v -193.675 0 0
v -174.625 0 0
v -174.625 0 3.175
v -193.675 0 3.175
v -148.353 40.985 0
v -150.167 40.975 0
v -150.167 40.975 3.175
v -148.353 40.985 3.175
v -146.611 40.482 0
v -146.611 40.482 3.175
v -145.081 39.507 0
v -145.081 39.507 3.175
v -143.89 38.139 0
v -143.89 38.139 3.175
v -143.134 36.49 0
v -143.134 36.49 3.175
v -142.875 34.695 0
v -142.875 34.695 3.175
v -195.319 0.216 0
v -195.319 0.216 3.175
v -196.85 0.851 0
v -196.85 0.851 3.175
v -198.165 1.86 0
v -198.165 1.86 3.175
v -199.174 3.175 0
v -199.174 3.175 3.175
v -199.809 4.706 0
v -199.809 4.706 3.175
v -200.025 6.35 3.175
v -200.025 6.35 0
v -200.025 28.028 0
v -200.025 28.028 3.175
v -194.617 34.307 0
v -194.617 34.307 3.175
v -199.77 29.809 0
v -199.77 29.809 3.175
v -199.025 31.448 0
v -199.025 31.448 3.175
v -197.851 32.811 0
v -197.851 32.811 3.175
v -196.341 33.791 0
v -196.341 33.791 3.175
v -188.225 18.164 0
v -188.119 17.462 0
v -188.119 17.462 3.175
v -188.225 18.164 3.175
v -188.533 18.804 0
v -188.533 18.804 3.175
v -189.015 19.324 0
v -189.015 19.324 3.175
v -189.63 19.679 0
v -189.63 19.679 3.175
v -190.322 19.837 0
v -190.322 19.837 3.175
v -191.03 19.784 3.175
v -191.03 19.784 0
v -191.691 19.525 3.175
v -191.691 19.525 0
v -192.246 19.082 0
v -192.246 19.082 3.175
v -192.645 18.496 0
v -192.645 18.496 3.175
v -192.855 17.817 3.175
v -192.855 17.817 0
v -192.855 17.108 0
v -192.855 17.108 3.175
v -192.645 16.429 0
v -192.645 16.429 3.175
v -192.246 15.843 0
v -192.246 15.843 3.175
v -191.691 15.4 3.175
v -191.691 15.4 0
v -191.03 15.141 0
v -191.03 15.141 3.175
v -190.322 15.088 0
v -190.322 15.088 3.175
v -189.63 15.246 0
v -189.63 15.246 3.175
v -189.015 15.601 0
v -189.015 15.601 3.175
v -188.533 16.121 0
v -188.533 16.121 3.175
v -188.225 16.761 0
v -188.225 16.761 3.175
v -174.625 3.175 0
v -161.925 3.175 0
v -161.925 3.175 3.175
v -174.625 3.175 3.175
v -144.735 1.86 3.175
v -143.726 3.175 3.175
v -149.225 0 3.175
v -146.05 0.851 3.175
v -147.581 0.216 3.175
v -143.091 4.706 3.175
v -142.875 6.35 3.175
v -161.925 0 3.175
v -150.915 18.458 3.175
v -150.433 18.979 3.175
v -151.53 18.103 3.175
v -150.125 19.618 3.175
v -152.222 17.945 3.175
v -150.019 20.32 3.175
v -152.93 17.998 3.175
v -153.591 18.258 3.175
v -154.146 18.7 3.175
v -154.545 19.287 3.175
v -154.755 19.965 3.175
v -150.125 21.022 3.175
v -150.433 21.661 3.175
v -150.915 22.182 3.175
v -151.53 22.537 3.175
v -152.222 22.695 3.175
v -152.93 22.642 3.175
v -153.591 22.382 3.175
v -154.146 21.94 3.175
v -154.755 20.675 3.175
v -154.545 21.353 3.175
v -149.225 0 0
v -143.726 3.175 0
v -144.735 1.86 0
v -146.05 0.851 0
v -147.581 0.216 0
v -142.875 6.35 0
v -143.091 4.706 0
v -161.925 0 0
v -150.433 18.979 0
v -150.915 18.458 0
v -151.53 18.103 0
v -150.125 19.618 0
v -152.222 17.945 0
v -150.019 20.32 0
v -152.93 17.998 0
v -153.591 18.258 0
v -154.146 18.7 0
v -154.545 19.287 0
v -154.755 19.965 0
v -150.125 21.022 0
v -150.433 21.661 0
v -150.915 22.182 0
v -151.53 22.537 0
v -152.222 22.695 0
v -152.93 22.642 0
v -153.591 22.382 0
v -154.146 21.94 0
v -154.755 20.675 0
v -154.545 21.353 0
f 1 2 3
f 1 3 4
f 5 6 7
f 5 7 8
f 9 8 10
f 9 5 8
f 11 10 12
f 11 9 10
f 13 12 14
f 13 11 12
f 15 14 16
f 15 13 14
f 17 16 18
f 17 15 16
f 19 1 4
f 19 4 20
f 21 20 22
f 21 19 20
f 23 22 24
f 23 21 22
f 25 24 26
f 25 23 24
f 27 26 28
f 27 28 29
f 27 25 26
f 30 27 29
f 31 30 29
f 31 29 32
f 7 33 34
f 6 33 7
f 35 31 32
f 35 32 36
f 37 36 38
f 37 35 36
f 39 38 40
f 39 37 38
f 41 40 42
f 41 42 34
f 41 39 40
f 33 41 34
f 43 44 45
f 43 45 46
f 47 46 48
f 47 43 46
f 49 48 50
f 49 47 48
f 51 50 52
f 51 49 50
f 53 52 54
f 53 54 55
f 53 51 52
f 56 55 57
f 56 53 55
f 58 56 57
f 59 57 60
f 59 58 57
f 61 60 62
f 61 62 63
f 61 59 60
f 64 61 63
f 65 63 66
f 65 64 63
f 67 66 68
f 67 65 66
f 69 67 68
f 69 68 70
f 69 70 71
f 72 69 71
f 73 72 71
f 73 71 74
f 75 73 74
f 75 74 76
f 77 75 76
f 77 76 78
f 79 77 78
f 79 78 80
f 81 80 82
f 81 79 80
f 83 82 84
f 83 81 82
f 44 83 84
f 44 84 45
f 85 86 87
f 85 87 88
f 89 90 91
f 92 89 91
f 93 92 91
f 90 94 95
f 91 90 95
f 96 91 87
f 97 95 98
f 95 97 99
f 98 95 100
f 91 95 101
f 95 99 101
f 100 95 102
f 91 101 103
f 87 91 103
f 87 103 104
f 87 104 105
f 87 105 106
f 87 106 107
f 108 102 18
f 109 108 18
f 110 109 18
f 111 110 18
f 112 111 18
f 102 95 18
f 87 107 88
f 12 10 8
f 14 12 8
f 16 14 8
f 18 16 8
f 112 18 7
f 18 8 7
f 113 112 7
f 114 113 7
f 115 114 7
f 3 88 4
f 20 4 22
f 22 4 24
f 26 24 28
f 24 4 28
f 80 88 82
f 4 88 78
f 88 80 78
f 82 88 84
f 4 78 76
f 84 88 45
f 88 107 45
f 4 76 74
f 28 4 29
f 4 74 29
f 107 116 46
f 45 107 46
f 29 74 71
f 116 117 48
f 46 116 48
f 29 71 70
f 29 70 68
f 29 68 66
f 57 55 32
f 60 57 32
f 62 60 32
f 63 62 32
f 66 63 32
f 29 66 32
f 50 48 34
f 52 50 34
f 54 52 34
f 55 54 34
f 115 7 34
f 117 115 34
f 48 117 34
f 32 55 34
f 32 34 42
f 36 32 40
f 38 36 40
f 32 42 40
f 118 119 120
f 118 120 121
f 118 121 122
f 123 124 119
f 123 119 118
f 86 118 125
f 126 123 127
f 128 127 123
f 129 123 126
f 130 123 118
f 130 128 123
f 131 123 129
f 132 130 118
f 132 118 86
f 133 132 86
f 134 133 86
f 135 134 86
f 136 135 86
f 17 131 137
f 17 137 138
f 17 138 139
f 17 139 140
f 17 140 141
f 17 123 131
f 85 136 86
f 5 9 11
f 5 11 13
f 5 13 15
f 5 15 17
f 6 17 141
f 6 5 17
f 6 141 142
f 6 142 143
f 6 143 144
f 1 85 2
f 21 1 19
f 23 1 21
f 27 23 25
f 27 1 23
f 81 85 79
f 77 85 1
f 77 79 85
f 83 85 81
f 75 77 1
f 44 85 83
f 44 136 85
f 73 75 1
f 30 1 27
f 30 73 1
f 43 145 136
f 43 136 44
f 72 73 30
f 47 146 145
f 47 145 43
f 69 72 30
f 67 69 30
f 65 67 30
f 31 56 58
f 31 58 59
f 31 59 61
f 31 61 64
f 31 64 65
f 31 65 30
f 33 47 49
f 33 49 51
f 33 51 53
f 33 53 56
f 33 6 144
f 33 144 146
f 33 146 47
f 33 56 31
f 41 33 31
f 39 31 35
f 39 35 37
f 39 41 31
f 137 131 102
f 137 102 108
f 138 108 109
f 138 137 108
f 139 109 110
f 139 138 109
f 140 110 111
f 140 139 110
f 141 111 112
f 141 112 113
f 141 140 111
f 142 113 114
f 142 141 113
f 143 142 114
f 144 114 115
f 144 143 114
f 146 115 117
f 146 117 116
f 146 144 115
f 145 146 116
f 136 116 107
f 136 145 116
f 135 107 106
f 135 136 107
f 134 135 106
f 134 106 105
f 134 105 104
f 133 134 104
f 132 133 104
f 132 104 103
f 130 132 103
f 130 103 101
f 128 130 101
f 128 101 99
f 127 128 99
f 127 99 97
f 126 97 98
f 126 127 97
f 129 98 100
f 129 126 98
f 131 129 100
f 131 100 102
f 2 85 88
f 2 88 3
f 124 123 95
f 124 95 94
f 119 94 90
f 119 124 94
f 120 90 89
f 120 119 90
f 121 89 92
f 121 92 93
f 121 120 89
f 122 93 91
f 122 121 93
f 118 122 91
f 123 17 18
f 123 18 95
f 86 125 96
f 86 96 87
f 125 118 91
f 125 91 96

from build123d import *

# Parameters (mm, degrees)
SKETCH1_R           = 2.38125
BOSS_EXTRUDE1_DEPTH = 3.175


with BuildPart() as part:
    # Sketch1 → Boss-Extrude1 (new body)
    with BuildSketch(Plane.XY):
        with BuildLine():
            Line((-174.625, 0), (-193.675, 0))
            ThreePointArc((-193.675, 0), (-198.165128061, 1.859871939), (-200.025, 6.35))
            Line((-200.025, 6.35), (-200.025, 28.027709878))
            ThreePointArc((-200.025, 28.027709878), (-198.486650336, 32.171442621), (-194.616961876, 34.307455719))
            Line((-194.616961876, 34.307455719), (-150.166961876, 40.974955719))
            ThreePointArc((-150.166961876, 40.974955719), (-145.081267257, 39.506860214), (-142.875, 34.695209878))
            Line((-142.875, 34.695209878), (-142.875, 6.35))
            ThreePointArc((-142.875, 6.35), (-144.734871939, 1.859871939), (-149.225, 0))
            Line((-149.225, 0), (-161.925, 0))
            Line((-161.925, 0), (-161.925, 3.175))
            Line((-161.925, 3.175), (-174.625, 3.175))
            Line((-174.625, 3.175), (-174.625, 0))
        make_face()
        with Locations((-190.5, 17.4625)):
            Circle(SKETCH1_R, mode=Mode.SUBTRACT)
        with Locations((-152.4, 20.32)):
            Circle(SKETCH1_R, mode=Mode.SUBTRACT)
    extrude(amount=BOSS_EXTRUDE1_DEPTH)


solid = part.part
